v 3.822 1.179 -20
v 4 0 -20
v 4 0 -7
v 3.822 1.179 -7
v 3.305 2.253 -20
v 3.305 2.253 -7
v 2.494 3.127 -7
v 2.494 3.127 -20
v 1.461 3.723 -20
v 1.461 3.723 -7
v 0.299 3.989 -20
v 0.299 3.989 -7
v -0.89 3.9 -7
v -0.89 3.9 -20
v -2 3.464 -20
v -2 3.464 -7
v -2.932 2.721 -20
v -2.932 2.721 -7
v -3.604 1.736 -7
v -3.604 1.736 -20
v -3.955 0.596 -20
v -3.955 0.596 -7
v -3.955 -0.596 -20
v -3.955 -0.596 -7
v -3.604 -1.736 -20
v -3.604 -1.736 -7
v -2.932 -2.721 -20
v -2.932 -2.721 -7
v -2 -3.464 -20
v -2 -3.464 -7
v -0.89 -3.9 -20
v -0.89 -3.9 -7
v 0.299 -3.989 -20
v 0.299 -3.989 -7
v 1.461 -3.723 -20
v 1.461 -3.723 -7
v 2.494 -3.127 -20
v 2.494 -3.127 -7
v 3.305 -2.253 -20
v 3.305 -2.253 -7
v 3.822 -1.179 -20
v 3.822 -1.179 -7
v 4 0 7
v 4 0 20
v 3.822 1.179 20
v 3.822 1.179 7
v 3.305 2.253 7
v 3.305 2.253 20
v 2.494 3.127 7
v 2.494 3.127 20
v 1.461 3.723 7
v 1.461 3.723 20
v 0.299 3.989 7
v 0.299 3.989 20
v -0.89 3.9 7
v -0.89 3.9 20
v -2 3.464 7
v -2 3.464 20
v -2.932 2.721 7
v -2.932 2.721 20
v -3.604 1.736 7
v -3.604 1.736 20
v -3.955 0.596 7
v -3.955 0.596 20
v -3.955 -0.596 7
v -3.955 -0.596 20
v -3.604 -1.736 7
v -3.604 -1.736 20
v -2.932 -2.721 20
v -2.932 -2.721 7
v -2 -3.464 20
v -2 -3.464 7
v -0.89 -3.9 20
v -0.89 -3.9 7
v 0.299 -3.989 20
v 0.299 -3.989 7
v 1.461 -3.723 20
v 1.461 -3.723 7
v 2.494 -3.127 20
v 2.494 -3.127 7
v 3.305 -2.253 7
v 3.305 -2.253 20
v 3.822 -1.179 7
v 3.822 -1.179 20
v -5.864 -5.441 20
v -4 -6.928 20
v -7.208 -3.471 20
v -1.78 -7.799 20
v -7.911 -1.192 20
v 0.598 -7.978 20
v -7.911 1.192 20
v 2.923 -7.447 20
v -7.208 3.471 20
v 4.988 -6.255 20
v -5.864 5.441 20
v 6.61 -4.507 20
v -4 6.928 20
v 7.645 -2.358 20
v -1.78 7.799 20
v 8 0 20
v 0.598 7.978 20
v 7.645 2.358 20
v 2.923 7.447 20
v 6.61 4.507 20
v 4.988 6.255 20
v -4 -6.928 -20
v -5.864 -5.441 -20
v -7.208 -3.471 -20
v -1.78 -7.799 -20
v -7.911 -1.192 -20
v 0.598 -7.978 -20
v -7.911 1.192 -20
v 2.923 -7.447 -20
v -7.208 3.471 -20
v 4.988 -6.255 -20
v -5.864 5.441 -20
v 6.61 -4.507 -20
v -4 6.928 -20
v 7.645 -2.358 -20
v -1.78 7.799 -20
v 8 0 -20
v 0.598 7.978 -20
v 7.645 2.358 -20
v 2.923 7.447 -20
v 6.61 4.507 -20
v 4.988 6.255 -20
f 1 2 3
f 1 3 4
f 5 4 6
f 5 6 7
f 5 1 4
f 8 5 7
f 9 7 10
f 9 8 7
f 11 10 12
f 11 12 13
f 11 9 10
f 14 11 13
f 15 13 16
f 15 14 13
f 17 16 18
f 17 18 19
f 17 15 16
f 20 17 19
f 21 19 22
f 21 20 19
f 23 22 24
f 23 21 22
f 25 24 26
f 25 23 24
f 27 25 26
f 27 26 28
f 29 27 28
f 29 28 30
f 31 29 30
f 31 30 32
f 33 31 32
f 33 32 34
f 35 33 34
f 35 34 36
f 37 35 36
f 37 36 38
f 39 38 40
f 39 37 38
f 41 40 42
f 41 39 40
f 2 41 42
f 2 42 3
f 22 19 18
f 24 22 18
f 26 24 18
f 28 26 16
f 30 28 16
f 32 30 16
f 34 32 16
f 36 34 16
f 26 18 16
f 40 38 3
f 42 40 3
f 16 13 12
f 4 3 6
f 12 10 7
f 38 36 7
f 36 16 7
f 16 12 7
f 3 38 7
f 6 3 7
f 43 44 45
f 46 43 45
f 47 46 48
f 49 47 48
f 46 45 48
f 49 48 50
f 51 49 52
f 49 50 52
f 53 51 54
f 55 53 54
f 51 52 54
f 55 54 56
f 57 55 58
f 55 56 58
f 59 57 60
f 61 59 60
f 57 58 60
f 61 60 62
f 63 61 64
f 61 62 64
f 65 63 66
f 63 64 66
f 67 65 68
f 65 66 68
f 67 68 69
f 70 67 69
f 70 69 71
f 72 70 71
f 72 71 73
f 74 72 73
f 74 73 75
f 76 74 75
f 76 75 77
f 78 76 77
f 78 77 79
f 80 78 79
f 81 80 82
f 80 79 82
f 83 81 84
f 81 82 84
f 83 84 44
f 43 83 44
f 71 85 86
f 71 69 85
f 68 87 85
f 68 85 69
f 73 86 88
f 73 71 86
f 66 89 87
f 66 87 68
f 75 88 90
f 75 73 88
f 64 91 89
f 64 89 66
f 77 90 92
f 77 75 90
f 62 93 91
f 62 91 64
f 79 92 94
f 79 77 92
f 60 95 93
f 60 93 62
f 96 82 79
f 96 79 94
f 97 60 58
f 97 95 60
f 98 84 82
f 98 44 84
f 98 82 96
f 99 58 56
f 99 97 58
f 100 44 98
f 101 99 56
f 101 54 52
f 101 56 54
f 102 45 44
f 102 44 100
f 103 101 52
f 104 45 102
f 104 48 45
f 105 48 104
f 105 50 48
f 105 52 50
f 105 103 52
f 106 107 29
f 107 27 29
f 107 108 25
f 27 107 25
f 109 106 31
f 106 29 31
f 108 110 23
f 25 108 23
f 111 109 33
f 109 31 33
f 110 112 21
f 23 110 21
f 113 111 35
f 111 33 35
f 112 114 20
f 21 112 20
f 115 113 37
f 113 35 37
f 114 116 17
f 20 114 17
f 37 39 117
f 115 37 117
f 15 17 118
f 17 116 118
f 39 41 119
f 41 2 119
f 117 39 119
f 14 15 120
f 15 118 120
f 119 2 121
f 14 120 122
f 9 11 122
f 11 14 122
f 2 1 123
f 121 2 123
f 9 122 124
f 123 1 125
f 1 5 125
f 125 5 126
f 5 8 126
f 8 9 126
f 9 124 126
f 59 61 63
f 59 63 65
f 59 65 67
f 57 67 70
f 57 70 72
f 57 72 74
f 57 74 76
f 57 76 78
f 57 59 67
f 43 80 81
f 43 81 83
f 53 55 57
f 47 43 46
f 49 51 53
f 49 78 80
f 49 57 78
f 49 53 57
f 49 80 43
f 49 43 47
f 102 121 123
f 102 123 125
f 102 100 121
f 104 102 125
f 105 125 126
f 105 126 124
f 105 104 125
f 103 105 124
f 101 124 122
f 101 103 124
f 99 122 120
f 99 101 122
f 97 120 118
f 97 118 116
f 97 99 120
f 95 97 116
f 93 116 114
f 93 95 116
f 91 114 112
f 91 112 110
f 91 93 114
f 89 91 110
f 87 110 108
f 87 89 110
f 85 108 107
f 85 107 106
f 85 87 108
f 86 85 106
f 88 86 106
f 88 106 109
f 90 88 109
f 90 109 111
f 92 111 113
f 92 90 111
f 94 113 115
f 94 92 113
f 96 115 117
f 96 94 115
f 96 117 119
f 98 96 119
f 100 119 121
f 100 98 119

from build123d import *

# Parameters (mm, degrees)
SKETCH_1_R          = 8
EXTRUDE_1_DEPTH     = 20
SKETCH_2_R          = 4
CUT_EXTRUDE_1_DEPTH = 13


with BuildPart() as part:
    # 草图1 → 凸台-拉伸1 (new body)
    with BuildSketch(Plane.XY):
        Circle(SKETCH_1_R)
    extrude(amount=EXTRUDE_1_DEPTH)

    # 草图2 → 切除-拉伸1 (cut)
    with BuildSketch(Plane.XY.offset(20)):
        Circle(SKETCH_2_R)
    extrude(amount=-CUT_EXTRUDE_1_DEPTH, mode=Mode.SUBTRACT)

    # 镜向1: part across plane


with BuildPart() as part_1:
    add(part.part)
    add(part.part.mirror(Plane.XY))


solid = part_1.part
